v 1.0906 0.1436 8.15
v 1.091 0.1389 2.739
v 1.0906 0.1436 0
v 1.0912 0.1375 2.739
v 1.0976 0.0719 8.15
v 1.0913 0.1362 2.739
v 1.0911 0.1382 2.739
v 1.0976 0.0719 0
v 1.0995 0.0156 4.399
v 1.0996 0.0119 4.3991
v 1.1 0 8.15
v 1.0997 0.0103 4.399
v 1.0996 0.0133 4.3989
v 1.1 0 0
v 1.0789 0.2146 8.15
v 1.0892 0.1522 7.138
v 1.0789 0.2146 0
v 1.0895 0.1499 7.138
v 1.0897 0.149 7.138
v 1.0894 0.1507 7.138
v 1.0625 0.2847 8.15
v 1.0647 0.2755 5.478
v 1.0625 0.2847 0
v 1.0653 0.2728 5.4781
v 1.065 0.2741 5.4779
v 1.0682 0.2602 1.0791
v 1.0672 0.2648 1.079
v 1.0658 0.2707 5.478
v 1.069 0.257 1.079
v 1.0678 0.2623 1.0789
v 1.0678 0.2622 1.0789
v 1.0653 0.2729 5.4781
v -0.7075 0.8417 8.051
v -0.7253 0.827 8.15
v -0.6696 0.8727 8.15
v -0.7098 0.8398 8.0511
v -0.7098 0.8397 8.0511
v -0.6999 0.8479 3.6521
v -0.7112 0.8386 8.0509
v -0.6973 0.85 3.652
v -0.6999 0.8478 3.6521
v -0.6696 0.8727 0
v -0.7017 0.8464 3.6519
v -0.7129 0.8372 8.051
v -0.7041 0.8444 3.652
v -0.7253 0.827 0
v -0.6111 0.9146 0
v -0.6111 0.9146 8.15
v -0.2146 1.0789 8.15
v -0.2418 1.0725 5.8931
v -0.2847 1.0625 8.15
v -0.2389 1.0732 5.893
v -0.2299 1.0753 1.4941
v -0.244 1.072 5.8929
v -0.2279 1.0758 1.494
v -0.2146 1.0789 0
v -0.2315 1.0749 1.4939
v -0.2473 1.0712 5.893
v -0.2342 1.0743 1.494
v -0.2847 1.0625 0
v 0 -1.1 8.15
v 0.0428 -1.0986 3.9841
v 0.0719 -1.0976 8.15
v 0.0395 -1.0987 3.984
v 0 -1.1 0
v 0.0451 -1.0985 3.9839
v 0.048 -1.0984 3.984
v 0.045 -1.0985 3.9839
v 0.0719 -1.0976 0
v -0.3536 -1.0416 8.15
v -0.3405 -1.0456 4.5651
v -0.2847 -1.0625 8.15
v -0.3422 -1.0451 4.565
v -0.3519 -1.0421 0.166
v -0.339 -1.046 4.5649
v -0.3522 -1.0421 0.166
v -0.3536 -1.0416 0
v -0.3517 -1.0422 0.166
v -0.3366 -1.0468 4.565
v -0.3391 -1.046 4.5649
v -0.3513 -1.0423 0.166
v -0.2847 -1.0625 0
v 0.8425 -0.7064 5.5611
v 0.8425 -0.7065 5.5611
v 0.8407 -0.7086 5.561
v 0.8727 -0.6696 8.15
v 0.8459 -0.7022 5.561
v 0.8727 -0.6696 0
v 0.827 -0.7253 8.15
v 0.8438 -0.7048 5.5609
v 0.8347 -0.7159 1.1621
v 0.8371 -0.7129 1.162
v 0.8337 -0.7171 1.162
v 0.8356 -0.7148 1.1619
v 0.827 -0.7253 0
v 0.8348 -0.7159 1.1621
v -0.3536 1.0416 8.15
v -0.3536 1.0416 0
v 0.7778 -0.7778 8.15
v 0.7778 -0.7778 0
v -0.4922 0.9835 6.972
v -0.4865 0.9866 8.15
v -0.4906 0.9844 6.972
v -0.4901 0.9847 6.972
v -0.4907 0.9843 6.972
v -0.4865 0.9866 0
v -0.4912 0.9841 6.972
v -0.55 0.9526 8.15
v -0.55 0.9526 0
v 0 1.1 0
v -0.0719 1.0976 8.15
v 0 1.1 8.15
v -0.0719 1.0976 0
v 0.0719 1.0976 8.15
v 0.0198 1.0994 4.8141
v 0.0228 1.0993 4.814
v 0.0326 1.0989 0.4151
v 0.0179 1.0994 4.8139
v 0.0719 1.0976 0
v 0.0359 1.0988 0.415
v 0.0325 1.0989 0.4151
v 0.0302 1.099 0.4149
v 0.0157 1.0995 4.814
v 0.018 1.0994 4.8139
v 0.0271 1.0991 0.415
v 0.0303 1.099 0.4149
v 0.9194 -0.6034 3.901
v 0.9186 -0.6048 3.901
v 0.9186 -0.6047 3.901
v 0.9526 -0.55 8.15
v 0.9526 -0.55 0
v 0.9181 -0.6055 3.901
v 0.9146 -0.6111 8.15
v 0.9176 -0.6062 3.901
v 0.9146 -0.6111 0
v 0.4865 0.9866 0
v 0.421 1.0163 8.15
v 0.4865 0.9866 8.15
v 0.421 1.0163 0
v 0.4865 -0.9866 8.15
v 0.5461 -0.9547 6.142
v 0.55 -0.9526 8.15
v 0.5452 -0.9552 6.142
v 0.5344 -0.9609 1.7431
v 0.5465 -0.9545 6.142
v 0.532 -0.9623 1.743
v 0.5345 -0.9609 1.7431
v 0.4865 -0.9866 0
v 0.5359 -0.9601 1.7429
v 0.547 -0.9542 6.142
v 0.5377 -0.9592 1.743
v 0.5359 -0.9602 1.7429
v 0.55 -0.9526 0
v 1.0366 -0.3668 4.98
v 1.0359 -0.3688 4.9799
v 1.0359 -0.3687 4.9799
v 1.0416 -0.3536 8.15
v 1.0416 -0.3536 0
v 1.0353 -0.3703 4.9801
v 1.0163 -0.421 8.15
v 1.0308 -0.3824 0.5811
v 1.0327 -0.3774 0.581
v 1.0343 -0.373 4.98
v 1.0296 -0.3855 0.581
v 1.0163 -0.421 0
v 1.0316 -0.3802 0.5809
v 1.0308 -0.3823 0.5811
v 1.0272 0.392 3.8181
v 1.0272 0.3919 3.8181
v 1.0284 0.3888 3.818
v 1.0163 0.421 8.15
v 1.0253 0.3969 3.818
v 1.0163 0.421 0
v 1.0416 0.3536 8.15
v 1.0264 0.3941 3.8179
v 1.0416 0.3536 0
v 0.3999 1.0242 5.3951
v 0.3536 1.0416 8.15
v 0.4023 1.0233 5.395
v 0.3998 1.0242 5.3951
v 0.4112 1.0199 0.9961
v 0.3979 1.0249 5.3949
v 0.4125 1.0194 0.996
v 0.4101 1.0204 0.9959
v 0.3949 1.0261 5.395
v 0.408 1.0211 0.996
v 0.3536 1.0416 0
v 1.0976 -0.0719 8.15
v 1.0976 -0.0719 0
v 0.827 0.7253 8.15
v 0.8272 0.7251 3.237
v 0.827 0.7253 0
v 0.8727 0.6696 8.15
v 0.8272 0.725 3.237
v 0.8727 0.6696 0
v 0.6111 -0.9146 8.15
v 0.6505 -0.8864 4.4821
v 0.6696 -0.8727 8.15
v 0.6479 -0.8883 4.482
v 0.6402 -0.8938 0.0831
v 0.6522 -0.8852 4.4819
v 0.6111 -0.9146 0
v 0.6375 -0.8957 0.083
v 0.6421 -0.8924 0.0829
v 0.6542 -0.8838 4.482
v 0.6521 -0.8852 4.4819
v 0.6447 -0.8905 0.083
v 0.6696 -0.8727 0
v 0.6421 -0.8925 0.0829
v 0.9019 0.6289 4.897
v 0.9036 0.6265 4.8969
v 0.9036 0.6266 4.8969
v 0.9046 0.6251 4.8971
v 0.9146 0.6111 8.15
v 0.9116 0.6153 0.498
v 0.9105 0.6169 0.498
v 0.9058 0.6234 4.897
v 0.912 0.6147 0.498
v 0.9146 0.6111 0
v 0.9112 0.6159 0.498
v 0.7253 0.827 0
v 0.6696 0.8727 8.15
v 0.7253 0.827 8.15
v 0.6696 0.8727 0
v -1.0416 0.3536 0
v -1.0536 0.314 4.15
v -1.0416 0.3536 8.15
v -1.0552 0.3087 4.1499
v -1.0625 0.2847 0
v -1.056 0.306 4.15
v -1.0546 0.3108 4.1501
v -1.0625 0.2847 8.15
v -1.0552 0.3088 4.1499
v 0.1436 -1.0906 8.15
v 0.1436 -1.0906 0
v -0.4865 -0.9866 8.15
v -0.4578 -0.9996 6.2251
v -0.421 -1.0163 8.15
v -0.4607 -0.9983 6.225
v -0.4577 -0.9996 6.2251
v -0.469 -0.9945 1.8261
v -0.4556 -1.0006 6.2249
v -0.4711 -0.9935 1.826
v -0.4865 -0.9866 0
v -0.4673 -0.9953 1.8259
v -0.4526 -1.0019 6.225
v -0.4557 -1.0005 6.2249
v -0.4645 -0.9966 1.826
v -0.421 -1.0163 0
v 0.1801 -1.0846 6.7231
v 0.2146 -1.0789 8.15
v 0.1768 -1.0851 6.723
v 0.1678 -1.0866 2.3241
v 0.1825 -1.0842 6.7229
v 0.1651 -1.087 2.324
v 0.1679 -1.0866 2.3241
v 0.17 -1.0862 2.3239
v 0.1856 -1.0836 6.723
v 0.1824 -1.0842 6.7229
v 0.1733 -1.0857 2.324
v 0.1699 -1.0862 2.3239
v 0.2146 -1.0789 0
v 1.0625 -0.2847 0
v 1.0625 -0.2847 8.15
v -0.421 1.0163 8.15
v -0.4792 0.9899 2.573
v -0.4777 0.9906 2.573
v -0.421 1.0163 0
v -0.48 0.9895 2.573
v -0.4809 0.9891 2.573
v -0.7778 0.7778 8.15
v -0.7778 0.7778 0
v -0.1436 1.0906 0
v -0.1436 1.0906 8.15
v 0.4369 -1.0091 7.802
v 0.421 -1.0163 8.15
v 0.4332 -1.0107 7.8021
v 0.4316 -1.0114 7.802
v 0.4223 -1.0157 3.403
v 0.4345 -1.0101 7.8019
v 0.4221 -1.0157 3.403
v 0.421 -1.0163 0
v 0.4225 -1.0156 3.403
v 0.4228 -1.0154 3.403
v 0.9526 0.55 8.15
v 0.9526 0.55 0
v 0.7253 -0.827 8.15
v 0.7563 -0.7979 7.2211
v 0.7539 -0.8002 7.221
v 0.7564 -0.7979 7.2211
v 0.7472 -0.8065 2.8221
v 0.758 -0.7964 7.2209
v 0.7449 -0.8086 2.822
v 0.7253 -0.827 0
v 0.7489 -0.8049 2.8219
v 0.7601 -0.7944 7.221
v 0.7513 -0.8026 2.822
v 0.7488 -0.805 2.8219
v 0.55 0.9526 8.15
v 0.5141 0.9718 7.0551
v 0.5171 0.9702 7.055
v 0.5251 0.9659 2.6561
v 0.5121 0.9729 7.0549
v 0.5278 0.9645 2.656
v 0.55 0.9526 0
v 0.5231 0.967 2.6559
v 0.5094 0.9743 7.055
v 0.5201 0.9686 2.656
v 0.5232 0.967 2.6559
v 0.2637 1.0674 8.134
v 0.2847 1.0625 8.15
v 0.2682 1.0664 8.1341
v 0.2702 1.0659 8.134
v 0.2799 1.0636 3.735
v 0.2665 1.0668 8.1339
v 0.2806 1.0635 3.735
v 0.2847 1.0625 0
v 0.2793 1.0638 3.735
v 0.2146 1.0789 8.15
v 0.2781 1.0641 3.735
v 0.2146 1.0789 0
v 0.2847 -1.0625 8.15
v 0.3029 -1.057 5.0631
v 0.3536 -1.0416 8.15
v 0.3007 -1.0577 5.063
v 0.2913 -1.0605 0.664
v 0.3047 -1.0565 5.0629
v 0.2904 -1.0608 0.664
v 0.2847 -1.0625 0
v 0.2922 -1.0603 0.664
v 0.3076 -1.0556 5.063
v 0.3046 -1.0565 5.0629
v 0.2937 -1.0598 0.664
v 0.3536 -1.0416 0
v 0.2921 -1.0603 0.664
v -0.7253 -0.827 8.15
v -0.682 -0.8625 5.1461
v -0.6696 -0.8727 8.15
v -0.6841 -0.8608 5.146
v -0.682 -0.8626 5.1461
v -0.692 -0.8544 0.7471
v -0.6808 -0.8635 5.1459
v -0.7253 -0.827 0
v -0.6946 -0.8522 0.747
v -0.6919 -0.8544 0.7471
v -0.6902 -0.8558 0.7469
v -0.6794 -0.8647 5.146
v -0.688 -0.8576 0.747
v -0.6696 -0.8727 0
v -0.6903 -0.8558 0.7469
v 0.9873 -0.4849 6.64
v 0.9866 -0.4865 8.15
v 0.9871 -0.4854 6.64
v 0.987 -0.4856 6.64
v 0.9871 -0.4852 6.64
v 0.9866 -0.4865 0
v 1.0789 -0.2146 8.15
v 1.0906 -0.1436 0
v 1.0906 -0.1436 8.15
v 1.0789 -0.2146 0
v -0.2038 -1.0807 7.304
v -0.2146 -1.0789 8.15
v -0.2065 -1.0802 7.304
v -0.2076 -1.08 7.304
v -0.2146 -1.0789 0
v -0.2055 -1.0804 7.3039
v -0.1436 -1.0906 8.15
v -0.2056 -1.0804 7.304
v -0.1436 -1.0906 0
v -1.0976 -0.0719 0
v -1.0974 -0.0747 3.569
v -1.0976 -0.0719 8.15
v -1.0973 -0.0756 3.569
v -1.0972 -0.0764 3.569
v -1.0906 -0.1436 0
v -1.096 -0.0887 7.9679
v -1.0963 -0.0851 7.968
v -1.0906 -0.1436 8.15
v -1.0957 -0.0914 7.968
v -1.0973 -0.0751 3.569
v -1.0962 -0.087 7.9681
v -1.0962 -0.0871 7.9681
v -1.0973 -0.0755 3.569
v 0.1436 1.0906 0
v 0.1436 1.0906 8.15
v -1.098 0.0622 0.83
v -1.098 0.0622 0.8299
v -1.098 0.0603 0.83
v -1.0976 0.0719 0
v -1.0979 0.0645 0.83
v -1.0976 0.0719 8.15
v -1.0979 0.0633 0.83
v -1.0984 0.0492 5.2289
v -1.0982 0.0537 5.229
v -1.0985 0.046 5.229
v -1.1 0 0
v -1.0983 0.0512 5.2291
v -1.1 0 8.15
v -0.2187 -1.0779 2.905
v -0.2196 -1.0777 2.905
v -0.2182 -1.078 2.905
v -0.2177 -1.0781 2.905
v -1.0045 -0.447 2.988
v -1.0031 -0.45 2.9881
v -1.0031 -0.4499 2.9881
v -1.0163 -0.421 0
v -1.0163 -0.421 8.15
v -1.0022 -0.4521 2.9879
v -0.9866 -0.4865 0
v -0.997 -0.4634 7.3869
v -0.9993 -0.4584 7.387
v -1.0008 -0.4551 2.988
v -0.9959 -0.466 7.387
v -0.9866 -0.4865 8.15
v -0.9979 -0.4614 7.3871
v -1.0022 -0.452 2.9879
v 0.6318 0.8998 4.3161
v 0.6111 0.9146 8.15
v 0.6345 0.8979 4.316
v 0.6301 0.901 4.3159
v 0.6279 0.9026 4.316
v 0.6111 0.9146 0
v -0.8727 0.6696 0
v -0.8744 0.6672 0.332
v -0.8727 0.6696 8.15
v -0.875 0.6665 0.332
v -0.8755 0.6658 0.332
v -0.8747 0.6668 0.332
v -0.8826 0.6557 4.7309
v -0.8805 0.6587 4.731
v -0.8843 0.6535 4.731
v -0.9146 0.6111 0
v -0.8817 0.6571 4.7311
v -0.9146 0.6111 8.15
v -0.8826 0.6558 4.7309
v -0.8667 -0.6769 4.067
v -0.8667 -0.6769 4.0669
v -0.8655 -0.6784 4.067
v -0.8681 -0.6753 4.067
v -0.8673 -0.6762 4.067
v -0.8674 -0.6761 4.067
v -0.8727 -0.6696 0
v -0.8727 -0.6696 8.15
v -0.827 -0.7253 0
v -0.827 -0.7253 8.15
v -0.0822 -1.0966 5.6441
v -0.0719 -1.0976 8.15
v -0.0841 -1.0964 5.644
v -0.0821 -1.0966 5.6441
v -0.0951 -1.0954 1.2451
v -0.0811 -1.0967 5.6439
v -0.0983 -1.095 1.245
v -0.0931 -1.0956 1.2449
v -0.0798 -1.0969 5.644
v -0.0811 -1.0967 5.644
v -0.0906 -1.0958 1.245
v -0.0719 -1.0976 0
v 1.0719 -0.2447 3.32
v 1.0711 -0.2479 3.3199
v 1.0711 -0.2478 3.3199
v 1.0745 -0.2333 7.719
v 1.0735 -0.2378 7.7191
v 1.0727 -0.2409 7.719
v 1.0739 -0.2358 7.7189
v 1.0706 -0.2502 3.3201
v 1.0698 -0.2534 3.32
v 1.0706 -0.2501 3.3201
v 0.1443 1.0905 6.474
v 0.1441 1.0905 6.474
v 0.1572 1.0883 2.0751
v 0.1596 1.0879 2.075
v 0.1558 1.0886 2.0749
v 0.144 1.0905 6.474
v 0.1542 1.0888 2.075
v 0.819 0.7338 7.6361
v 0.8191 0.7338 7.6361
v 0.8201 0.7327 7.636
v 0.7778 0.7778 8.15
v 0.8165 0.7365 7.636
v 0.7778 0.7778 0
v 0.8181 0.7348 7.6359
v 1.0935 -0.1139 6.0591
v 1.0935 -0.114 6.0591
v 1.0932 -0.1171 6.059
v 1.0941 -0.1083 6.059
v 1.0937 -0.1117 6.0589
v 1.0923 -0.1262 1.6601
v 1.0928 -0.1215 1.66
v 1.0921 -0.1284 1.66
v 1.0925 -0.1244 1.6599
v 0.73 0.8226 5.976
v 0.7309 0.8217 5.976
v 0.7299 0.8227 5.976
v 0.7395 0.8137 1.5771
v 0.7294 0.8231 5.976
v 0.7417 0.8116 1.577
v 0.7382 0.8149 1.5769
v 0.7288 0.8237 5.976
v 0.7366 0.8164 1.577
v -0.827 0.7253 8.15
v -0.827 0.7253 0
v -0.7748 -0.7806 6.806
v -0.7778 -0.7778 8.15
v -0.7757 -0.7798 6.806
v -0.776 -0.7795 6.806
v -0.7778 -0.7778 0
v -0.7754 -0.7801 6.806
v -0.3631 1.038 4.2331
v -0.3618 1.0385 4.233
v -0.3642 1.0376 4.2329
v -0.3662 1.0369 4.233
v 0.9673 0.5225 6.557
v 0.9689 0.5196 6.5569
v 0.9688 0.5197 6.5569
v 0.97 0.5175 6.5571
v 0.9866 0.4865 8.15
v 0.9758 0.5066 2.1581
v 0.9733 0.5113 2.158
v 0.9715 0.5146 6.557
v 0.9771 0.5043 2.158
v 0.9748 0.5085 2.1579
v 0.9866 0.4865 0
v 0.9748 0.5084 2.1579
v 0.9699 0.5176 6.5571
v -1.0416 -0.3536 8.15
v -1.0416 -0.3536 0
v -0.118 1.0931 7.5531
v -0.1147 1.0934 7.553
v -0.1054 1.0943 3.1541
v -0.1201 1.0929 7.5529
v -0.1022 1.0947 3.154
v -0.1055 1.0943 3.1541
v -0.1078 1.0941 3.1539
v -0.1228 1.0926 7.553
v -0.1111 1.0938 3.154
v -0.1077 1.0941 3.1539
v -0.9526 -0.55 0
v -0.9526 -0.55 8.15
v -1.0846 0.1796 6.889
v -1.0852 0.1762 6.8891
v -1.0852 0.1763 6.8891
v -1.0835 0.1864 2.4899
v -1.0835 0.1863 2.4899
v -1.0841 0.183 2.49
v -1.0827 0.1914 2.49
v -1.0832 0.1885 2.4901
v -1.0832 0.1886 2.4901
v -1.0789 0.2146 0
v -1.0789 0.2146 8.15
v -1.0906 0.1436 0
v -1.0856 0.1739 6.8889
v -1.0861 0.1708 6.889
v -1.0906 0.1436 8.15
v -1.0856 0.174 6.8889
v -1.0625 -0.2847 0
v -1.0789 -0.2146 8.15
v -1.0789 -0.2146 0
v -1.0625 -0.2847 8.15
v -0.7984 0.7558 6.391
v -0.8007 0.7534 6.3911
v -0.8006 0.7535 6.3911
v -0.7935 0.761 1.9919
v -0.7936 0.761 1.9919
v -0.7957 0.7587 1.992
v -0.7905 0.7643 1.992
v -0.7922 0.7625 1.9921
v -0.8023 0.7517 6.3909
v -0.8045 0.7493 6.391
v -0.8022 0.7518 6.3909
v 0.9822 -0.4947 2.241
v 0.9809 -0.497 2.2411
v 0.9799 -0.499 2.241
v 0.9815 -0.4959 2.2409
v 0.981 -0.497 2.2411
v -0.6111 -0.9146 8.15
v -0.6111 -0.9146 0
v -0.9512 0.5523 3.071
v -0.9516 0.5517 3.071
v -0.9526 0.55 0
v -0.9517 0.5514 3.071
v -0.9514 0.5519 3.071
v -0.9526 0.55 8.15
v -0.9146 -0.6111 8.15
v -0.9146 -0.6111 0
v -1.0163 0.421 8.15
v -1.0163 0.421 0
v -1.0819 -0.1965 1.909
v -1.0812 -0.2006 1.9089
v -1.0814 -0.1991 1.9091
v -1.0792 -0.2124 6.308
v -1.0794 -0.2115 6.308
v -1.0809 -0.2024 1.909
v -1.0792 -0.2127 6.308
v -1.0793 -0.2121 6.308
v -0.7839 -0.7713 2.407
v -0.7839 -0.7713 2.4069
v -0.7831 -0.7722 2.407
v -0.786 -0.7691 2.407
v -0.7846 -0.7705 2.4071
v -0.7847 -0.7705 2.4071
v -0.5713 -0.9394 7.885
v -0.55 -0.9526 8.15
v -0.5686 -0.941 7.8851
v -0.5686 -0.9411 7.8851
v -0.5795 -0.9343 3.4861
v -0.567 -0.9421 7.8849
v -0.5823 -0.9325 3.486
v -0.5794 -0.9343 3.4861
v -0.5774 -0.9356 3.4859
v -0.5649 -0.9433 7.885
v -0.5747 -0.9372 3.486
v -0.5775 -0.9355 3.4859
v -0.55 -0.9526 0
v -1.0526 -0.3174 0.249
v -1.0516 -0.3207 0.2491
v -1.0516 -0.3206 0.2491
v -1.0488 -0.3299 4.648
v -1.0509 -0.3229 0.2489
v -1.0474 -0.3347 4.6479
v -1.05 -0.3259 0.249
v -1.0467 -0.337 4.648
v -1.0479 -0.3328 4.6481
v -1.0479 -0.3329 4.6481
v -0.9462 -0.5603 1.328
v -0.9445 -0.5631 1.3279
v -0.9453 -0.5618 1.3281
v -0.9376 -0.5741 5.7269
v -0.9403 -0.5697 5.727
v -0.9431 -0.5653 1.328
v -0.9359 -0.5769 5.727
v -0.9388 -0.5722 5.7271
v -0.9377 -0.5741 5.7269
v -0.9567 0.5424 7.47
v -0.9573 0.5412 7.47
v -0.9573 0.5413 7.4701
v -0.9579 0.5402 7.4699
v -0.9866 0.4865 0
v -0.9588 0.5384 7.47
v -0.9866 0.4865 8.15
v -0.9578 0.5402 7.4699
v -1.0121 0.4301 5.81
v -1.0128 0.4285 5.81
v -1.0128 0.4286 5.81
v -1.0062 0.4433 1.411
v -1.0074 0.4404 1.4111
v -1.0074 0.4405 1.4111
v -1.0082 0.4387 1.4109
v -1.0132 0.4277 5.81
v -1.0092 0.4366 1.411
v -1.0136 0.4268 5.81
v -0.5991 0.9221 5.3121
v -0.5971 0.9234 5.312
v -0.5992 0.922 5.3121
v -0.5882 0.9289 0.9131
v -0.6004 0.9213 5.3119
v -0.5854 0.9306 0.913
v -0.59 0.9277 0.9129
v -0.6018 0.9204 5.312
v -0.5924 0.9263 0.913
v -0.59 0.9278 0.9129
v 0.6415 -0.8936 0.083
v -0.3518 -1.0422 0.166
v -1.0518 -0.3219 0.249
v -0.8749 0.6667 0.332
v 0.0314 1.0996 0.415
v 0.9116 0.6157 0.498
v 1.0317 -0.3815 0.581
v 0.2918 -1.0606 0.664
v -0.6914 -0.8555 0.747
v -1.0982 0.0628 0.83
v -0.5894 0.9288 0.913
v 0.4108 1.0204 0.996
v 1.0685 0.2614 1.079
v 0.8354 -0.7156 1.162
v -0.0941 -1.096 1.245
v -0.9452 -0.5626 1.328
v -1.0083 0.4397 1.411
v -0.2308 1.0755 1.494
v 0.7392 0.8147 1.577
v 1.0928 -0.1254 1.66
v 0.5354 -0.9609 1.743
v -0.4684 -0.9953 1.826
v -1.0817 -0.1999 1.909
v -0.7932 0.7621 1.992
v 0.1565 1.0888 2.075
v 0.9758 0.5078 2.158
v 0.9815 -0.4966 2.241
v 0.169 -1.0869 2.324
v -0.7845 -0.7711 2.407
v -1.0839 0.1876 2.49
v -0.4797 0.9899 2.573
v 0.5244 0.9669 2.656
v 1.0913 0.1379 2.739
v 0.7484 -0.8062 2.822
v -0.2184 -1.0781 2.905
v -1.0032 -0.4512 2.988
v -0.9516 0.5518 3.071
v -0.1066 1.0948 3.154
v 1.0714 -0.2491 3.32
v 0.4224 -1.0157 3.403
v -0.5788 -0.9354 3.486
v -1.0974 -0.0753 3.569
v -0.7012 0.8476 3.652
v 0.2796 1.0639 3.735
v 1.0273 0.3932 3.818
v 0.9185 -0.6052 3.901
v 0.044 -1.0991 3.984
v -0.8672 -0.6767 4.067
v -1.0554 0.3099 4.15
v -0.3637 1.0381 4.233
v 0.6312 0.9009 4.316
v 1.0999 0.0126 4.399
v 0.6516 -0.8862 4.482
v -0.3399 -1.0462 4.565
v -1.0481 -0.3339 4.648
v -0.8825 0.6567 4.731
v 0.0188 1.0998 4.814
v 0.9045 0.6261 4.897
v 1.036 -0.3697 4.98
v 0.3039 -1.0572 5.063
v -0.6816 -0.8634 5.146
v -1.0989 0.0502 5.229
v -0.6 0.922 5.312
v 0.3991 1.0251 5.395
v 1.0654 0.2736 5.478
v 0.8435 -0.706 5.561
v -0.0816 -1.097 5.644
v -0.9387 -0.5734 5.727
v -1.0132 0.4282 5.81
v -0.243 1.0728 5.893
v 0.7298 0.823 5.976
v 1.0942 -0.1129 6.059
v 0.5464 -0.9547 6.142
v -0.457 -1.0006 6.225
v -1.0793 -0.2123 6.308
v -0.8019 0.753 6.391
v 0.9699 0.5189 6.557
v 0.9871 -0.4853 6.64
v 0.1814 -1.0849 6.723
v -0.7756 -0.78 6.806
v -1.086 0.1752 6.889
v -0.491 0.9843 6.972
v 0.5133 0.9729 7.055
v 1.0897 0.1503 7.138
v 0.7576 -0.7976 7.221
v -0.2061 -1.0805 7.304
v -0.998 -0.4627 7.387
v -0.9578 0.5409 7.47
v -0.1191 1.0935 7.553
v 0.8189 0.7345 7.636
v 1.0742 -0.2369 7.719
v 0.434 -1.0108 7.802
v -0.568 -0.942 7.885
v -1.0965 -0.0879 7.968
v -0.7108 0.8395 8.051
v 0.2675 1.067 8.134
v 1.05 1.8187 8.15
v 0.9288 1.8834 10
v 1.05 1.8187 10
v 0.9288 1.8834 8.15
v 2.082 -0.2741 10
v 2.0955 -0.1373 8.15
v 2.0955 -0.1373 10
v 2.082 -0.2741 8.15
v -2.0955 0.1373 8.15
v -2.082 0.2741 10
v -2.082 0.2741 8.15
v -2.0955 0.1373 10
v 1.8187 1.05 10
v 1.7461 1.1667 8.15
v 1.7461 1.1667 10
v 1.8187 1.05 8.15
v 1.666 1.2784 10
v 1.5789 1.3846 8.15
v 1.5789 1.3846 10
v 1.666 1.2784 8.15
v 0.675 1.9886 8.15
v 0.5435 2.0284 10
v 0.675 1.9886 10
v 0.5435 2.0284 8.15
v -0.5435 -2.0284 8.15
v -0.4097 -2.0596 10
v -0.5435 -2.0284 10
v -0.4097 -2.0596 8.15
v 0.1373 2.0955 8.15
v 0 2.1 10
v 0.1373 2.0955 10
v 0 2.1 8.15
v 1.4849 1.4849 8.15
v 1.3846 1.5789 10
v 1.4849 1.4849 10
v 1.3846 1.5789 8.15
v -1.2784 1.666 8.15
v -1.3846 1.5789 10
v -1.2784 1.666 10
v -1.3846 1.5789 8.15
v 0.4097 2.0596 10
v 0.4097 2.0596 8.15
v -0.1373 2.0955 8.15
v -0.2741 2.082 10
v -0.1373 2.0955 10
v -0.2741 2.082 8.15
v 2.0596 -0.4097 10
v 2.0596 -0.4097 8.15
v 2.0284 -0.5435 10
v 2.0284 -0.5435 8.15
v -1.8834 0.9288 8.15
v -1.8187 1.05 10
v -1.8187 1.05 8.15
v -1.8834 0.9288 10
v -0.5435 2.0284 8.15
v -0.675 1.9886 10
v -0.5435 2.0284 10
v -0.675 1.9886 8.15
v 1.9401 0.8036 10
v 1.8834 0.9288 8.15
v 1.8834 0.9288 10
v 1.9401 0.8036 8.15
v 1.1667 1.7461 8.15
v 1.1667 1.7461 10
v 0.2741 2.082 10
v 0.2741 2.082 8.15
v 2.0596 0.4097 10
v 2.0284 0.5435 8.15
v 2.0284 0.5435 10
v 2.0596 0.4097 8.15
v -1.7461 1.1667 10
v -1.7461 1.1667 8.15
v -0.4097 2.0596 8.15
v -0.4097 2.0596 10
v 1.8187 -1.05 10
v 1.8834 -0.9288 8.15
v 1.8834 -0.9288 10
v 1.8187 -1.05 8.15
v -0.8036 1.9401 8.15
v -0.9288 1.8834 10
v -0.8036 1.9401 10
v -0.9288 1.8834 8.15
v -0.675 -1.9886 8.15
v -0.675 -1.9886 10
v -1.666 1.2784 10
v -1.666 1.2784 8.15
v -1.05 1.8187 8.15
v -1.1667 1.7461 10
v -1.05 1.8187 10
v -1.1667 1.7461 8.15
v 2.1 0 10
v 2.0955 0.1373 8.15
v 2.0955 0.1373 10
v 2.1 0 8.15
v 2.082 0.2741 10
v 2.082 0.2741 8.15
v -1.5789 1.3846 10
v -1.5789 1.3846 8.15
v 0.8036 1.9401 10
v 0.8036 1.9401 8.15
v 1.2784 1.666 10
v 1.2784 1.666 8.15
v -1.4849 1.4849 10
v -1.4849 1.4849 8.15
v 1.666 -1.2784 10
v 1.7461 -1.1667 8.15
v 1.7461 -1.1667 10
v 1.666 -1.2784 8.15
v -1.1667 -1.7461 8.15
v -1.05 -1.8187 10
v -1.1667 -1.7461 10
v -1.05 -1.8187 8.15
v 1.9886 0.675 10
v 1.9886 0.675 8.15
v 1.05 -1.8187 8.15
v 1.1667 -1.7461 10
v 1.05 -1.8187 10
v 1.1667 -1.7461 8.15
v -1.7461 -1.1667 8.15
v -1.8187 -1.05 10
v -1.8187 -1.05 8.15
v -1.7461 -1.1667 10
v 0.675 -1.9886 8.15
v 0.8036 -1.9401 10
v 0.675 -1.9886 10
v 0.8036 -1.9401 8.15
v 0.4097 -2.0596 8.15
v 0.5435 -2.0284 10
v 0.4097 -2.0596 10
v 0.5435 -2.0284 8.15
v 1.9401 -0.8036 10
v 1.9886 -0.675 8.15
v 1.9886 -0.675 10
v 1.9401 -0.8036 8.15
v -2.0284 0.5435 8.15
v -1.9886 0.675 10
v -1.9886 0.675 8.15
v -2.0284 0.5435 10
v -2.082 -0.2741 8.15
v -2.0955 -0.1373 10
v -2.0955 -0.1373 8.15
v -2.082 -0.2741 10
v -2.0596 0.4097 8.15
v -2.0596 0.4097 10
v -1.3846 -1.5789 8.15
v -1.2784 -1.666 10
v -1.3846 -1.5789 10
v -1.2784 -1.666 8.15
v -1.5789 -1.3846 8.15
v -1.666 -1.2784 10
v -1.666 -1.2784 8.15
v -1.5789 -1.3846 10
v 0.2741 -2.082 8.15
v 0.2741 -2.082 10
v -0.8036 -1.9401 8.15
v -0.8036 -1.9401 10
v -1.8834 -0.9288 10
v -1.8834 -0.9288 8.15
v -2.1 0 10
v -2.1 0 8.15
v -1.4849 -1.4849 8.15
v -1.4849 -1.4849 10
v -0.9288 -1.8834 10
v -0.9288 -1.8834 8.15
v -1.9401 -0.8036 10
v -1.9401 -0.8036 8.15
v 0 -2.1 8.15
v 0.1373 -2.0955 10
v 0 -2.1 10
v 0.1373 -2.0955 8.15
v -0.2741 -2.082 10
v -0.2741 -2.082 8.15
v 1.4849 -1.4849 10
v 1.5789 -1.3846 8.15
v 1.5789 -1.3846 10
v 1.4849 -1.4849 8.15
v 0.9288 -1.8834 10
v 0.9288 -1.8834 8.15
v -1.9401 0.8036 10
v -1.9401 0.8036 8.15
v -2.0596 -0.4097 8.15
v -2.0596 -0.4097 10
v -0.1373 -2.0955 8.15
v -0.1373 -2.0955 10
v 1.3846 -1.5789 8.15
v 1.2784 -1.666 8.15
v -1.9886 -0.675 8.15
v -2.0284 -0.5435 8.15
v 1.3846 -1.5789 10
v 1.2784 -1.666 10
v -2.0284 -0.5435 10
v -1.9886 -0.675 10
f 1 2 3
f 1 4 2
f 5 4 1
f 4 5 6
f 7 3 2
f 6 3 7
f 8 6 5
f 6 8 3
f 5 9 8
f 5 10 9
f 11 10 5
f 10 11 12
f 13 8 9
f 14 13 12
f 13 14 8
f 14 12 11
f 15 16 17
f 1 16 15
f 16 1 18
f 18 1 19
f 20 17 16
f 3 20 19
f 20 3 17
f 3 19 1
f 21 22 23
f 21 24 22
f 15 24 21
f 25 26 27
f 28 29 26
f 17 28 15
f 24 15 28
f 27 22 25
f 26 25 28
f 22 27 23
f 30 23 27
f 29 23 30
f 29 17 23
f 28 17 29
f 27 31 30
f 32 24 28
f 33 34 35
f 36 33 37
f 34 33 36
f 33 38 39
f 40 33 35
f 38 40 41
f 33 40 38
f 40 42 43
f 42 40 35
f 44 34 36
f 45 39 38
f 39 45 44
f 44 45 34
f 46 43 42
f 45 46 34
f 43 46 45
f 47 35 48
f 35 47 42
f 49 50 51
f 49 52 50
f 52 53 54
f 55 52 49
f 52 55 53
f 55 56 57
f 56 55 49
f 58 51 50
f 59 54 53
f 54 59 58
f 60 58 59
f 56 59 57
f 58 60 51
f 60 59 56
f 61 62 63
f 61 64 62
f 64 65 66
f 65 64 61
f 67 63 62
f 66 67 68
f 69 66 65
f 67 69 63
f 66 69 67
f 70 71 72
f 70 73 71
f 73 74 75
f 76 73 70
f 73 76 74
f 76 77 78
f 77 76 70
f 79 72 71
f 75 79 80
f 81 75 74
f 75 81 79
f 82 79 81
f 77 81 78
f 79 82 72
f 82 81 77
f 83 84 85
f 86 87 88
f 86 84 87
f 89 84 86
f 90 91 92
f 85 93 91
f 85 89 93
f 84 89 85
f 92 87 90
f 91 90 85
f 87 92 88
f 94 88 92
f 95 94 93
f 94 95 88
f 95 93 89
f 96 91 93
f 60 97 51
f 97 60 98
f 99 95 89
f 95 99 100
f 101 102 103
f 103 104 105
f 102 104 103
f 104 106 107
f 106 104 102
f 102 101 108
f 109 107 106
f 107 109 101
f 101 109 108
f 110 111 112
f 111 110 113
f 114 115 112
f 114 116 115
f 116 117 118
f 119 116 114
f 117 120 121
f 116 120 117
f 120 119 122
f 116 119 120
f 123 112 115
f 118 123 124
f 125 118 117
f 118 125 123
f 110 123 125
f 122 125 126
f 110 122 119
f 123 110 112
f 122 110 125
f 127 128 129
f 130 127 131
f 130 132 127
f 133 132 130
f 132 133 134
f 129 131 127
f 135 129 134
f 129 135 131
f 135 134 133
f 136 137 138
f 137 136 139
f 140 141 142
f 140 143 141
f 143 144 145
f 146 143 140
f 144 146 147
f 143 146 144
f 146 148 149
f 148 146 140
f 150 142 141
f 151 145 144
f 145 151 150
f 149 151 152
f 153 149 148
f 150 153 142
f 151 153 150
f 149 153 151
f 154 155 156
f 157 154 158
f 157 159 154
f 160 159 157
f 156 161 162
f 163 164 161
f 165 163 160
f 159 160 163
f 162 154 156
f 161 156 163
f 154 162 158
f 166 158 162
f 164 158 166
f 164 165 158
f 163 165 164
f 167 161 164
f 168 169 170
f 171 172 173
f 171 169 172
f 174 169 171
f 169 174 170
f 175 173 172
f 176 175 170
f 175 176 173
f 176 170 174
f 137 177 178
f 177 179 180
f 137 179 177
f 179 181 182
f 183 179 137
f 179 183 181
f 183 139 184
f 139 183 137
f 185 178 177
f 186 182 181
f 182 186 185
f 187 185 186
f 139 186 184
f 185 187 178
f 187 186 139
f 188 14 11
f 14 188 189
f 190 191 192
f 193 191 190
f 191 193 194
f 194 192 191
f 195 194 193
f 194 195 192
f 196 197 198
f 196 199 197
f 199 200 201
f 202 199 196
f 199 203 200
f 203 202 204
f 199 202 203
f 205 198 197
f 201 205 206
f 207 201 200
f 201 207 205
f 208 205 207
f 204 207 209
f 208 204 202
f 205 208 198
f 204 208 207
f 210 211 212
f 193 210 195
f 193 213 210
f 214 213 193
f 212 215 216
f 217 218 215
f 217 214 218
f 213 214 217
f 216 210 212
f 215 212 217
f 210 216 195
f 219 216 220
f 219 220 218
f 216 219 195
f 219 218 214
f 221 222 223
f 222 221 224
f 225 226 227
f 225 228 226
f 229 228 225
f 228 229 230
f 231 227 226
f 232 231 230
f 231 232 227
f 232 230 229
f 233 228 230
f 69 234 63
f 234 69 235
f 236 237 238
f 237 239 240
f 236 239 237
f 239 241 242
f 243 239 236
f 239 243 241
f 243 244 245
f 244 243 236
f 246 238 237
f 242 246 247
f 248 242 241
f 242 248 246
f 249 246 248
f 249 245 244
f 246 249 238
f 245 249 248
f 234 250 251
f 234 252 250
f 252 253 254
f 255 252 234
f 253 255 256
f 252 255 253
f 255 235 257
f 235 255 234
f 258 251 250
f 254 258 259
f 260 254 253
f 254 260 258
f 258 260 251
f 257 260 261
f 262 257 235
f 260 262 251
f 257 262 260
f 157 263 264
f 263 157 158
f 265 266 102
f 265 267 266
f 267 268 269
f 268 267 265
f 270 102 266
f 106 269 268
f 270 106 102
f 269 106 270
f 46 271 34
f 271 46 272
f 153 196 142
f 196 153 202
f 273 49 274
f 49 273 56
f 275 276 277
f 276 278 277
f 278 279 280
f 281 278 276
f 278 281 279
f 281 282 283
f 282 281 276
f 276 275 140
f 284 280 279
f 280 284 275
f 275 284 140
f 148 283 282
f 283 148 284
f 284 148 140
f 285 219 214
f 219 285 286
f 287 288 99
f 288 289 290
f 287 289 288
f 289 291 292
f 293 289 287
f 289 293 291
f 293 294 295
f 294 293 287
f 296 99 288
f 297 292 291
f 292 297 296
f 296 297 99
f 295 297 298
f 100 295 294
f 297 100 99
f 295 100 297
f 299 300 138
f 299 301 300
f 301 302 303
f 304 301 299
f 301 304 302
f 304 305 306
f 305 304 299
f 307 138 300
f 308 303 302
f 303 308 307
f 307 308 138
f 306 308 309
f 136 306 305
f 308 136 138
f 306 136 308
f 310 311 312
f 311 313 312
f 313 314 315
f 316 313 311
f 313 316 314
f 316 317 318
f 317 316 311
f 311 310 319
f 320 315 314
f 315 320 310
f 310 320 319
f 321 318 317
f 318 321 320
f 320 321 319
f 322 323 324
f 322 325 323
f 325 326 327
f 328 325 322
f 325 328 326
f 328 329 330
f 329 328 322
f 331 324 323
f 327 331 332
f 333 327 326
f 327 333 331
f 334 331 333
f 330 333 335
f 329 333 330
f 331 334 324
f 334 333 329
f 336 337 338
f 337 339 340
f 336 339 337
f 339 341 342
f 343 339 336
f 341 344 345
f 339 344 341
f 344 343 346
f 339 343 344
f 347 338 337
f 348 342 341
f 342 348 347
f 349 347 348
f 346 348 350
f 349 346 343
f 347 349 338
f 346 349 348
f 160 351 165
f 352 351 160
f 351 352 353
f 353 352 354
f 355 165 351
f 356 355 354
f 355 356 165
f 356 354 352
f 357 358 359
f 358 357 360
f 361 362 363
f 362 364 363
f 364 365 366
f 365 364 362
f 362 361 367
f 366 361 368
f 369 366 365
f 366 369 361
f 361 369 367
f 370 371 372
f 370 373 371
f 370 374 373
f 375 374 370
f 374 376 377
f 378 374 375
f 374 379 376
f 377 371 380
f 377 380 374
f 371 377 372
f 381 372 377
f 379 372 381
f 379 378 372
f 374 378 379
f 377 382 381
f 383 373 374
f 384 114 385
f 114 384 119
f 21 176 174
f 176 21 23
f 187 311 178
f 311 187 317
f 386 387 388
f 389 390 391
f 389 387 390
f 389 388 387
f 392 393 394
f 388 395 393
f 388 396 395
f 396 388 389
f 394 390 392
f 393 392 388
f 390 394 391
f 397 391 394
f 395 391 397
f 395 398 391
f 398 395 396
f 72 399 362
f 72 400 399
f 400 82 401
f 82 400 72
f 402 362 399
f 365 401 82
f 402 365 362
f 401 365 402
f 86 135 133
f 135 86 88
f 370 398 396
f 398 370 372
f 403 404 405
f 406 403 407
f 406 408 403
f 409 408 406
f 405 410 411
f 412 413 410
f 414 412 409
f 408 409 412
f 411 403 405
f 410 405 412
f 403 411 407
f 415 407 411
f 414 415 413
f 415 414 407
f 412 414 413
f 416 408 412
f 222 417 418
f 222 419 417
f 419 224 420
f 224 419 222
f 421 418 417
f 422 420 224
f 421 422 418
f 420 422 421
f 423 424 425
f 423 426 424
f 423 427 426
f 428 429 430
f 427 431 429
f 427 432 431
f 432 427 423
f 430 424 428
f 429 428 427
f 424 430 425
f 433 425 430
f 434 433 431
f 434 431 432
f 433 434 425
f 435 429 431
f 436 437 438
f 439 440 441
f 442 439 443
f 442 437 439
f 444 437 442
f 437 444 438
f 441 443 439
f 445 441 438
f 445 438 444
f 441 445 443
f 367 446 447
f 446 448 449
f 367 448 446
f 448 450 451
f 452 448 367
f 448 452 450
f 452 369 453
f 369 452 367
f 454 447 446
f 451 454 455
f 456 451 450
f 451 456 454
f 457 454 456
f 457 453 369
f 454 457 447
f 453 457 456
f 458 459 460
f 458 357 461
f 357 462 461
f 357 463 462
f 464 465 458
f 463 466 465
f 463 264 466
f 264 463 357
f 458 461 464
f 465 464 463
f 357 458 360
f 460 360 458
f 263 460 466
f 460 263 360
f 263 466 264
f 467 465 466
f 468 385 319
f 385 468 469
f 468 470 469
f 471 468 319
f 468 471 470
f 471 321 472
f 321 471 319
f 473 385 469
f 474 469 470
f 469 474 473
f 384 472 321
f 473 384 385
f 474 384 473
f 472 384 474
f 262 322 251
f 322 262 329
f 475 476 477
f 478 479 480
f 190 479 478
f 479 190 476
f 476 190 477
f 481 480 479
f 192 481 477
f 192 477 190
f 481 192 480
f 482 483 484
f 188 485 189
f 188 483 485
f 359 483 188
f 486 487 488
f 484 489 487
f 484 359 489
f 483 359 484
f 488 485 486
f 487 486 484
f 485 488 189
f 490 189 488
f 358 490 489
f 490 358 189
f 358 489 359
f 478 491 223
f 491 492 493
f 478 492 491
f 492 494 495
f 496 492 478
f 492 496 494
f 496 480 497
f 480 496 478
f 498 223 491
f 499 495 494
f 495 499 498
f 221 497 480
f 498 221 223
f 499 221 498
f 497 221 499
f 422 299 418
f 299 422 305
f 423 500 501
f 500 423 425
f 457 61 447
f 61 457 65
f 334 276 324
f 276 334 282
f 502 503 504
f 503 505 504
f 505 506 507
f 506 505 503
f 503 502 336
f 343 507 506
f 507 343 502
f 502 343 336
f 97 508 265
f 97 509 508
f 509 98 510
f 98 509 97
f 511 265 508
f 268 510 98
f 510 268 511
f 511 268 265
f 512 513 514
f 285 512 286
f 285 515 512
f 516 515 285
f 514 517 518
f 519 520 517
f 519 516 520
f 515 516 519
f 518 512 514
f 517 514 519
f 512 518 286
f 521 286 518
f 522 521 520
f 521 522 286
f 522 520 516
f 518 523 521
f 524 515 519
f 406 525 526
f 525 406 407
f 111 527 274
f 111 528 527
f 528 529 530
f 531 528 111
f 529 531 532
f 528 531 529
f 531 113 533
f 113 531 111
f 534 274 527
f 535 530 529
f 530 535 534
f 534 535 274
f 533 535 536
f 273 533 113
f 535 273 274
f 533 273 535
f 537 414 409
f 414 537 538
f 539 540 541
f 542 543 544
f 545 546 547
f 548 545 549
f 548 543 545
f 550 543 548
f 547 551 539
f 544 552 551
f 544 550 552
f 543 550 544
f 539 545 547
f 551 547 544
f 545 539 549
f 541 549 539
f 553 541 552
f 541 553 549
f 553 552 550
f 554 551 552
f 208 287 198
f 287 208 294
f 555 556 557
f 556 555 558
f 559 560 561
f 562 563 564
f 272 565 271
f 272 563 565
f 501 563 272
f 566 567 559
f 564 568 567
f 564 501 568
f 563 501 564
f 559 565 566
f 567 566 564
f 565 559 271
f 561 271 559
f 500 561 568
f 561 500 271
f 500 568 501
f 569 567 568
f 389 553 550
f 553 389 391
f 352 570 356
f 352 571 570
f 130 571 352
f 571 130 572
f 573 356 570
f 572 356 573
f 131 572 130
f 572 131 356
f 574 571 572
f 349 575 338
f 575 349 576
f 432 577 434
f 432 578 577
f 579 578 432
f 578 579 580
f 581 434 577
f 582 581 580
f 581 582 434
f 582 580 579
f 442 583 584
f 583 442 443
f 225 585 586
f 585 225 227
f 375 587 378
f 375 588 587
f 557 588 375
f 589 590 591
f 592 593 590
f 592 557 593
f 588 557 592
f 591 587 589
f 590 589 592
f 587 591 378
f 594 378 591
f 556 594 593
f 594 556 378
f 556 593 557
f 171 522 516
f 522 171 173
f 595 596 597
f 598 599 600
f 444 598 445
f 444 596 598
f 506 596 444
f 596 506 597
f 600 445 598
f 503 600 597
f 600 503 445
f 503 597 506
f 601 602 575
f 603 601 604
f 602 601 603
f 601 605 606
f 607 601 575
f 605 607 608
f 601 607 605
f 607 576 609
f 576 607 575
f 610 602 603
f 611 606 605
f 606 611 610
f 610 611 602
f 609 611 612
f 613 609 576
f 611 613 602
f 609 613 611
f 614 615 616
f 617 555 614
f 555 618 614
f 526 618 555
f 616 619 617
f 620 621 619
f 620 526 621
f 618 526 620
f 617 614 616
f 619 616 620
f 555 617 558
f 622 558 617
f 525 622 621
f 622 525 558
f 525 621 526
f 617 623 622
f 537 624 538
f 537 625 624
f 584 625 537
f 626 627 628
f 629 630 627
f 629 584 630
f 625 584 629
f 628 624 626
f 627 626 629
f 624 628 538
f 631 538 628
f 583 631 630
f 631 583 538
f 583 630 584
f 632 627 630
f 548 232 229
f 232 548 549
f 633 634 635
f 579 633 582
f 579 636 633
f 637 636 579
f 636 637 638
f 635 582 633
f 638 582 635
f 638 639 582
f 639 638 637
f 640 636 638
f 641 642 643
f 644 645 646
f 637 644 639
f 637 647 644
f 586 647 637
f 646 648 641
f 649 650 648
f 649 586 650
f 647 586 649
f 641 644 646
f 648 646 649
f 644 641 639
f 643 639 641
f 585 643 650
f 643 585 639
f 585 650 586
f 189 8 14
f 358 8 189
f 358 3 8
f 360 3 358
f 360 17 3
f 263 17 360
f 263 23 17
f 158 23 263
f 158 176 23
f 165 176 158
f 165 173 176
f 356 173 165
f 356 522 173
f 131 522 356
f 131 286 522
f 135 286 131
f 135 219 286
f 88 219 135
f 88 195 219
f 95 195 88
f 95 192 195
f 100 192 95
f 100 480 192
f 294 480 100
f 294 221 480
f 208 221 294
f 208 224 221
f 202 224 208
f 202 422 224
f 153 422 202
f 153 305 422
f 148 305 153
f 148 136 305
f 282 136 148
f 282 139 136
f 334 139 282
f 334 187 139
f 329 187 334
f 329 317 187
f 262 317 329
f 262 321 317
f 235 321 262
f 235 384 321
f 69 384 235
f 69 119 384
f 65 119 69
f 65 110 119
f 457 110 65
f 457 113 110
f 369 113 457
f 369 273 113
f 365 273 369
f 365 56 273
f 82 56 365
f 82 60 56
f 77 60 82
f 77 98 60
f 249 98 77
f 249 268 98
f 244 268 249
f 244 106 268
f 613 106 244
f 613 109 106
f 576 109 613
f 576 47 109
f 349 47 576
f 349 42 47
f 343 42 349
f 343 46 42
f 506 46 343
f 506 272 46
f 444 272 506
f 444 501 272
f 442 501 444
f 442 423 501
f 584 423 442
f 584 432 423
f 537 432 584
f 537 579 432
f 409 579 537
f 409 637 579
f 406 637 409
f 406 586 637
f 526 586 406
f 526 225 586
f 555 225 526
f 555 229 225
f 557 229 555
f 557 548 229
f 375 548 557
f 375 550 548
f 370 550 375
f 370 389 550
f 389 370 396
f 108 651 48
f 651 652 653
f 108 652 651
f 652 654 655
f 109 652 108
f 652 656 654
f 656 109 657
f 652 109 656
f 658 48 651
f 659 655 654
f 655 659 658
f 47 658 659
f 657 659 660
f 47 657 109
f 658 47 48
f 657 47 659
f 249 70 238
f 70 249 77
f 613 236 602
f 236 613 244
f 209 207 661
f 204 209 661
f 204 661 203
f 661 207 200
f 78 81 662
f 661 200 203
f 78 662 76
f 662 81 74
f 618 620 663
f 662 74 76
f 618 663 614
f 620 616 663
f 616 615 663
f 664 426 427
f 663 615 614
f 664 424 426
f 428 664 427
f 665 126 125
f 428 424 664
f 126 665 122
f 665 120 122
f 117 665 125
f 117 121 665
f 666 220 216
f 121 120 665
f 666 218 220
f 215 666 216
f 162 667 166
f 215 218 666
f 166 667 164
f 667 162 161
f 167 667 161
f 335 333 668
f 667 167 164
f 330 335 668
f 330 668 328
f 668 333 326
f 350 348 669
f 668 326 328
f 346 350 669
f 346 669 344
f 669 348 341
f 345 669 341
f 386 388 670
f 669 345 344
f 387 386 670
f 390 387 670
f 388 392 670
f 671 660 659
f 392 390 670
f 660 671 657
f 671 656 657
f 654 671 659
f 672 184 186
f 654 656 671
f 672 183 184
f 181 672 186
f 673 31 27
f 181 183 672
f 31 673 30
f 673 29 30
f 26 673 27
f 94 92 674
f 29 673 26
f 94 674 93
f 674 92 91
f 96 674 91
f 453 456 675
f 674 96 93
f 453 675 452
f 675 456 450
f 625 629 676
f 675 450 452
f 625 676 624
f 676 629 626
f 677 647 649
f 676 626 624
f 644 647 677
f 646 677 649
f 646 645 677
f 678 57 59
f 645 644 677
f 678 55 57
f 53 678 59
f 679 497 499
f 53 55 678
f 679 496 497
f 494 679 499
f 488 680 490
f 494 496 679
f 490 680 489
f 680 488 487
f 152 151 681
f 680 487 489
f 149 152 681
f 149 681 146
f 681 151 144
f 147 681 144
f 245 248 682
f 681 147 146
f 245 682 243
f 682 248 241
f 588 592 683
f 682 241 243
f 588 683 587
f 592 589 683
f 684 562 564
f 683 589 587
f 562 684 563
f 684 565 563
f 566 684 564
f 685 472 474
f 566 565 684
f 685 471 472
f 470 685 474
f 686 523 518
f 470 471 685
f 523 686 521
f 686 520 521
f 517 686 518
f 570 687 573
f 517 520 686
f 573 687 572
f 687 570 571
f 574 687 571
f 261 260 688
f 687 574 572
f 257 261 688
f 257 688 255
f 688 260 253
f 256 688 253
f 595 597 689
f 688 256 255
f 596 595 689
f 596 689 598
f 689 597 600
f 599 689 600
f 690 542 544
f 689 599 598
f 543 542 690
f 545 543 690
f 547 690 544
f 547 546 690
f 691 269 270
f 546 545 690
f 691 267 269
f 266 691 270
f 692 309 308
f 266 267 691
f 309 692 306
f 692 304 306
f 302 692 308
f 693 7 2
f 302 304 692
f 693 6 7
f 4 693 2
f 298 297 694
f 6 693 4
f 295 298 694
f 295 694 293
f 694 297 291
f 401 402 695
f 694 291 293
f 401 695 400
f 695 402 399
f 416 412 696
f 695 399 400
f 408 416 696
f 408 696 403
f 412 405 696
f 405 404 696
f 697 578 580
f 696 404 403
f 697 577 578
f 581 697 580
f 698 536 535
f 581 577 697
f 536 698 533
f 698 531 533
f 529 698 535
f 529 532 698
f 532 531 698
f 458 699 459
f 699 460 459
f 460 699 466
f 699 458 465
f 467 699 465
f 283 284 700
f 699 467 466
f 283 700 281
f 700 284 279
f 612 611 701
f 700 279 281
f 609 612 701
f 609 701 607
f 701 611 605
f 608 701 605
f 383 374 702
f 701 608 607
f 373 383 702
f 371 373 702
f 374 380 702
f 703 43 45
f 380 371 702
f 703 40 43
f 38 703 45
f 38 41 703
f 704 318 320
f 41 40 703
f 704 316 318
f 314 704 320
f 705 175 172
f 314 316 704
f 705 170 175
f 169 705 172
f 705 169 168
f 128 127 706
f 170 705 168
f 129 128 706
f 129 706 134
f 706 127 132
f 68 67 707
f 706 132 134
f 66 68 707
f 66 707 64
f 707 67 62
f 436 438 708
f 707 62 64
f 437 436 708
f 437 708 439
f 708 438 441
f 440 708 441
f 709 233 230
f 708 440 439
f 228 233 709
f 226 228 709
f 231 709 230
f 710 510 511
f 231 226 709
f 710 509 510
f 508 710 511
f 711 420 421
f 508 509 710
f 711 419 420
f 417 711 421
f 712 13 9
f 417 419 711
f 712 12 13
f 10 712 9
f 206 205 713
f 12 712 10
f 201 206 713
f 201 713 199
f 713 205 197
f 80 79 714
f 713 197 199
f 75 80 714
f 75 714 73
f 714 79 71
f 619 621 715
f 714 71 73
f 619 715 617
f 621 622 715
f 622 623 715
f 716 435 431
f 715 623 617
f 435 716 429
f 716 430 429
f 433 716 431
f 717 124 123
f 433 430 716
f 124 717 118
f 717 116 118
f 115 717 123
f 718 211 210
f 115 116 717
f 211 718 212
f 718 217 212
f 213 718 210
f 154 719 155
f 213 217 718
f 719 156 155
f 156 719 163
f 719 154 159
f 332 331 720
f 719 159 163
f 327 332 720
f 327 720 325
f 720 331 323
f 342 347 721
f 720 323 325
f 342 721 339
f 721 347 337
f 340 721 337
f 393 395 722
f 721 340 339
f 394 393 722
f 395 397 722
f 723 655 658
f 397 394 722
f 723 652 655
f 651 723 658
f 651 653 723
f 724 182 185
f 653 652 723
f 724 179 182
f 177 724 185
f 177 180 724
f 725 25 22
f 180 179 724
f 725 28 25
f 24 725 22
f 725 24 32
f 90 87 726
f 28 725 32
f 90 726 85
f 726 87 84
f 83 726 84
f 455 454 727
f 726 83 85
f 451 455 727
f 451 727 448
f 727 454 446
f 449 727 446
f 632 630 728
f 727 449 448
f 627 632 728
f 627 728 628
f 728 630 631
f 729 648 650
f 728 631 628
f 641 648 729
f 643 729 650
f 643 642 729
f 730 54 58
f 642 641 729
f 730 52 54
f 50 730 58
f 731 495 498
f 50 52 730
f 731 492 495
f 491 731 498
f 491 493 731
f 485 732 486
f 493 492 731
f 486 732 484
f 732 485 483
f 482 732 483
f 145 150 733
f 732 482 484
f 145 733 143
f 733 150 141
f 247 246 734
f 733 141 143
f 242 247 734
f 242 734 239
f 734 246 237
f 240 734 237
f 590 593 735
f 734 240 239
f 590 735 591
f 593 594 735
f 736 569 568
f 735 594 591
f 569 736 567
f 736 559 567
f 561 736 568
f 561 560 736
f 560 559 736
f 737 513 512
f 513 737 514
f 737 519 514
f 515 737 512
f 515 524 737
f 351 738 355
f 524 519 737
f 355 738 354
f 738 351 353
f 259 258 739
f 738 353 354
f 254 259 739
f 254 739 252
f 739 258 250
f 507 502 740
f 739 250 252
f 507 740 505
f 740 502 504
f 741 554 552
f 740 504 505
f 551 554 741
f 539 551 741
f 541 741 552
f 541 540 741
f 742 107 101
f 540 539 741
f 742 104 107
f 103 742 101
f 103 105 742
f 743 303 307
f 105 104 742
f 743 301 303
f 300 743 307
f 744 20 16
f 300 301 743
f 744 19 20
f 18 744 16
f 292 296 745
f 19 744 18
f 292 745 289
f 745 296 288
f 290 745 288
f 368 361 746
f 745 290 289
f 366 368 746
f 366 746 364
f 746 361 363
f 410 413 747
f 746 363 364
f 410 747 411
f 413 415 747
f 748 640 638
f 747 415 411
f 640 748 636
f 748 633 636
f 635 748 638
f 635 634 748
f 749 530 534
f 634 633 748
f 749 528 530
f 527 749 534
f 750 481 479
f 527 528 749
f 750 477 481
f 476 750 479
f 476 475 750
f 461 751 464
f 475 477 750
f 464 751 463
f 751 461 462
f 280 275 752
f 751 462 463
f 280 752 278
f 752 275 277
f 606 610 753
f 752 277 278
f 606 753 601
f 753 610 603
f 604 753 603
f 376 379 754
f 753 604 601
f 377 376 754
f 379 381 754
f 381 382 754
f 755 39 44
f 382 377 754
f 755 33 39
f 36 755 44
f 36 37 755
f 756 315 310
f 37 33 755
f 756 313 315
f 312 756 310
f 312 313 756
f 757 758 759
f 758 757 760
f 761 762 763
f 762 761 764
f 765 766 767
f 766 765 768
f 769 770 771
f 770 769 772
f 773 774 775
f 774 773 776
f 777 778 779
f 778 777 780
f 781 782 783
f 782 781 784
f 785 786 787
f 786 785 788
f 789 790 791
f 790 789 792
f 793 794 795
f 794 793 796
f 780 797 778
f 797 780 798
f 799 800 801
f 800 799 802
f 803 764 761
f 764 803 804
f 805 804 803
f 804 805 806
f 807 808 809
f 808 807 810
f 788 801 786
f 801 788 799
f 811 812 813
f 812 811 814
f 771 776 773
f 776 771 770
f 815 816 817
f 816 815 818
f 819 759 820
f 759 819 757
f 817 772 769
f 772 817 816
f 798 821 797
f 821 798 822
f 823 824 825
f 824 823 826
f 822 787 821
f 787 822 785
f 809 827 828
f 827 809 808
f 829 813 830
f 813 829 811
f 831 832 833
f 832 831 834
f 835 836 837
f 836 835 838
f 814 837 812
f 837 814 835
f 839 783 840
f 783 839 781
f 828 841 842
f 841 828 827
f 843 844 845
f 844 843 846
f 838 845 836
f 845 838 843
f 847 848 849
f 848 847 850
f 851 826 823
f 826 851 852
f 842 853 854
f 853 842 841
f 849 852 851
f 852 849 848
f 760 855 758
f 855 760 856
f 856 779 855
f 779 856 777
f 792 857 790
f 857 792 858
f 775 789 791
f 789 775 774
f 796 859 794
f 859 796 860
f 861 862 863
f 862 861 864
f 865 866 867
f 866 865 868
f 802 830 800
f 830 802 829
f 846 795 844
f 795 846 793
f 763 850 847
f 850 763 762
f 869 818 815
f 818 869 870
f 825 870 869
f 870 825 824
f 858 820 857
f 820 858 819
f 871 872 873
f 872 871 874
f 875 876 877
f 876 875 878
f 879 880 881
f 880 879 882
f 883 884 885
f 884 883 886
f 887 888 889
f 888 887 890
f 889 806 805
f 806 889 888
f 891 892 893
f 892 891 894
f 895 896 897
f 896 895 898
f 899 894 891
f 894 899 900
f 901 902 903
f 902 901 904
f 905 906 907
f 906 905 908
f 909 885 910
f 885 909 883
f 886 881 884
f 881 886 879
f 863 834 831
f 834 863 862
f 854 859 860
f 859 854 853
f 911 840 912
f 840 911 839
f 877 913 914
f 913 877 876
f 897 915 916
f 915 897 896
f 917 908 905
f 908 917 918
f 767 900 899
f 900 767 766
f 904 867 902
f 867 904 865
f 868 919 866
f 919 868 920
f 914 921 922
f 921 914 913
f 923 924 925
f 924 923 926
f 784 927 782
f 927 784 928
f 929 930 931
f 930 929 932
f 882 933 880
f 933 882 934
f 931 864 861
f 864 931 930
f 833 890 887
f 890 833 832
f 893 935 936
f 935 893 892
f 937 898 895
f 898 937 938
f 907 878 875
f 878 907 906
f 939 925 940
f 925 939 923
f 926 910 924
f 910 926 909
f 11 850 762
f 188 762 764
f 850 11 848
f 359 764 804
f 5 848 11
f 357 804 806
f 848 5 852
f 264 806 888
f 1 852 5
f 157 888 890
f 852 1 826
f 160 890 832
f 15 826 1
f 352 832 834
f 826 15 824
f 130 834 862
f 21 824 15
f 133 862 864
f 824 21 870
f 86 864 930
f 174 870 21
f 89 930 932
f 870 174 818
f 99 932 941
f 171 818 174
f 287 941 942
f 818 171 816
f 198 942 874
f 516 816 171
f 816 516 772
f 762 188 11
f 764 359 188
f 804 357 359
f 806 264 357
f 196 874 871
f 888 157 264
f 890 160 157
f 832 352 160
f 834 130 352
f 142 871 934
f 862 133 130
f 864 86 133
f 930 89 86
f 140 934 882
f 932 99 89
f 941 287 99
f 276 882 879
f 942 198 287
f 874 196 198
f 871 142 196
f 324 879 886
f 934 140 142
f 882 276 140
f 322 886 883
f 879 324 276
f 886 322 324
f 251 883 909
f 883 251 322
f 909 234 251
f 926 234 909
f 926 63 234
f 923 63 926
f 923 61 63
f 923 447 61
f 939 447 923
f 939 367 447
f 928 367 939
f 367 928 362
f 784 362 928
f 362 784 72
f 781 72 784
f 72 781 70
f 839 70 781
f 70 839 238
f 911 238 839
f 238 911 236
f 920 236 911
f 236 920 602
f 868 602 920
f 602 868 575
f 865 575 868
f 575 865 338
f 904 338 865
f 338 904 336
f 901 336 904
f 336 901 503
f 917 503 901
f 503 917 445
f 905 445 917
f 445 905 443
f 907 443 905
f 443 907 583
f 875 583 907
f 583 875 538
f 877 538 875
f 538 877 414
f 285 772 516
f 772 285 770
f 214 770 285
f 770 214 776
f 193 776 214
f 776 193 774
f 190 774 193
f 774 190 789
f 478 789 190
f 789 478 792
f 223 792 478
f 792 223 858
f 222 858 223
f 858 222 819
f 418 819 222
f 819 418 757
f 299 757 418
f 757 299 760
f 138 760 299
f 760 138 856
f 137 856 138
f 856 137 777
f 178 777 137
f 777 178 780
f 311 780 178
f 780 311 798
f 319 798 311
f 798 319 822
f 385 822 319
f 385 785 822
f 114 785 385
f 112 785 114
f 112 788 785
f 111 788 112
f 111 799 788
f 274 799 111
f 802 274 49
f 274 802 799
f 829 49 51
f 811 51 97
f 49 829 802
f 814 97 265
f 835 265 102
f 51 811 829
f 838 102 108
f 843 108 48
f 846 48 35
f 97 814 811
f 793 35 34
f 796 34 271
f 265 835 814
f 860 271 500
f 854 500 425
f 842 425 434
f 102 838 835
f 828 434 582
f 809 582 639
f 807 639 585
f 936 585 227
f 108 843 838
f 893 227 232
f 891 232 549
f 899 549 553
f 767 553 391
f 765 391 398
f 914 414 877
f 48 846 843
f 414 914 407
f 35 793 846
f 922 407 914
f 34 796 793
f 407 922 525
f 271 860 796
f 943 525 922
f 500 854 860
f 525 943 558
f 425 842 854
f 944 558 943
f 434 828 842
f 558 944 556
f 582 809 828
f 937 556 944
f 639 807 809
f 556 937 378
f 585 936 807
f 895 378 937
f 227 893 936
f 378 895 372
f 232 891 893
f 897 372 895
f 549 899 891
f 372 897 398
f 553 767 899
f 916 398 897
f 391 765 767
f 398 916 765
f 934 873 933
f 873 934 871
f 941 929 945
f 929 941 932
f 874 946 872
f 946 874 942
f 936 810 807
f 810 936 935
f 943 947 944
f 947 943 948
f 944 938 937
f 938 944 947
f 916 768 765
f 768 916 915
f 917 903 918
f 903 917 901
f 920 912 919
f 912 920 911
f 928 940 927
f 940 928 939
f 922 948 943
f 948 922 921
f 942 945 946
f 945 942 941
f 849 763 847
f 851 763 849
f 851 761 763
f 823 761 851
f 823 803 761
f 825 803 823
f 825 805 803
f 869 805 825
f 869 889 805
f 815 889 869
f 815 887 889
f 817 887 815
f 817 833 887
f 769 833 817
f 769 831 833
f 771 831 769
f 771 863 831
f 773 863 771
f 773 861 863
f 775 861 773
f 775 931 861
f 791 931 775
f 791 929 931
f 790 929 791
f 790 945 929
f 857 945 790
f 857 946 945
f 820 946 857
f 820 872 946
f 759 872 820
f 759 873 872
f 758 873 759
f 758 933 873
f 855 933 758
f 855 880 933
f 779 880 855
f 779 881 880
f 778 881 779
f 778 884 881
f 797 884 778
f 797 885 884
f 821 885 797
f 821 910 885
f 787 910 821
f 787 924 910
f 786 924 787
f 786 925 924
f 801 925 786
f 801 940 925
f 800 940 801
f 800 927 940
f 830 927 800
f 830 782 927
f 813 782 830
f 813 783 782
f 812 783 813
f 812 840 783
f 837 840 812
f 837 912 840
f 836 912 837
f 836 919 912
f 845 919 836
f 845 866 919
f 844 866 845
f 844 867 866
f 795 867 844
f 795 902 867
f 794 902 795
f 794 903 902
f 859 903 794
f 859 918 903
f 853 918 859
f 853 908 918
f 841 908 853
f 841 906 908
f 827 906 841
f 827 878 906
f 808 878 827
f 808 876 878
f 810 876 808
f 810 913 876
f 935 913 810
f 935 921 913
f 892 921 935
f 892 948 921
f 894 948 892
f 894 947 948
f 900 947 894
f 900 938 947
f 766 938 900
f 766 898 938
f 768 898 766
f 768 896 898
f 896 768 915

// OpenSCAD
// Pan head screw (single connected solid)
// Target: shaft Ø2.2mm, head Ø4.2mm, head height 1.7mm, total length 10mm

$fn = 96;

// Parameters
shaft_diameter = 2.2;
shaft_radius   = shaft_diameter/2;

length         = 10;

head_diameter  = 4.2;
head_radius    = head_diameter/2;
head_height    = 1.7;

// Thread approximation (visual)
thread_pitch   = 0.55;   // mm
thread_depth   = 0.18;   // mm (radial)
thread_len     = length - head_height; // threaded shank length

// Small overlap to guarantee manifold union
overlap = 0.15;

// Pan head profile controls
head_top_flat_r = head_radius * 0.55;  // small flat on top
head_fillet_r   = 0.35;               // rounding at head/shank junction

module pan_head_screw() {
    union() {
        // Shank core (cylindrical)
        translate([0,0,0])
            cylinder(h=thread_len + overlap, r=shaft_radius, center=false);

        // Approximate external thread as a helical ridge (unioned, not subtracted)
        // Keeps model one connected solid and visually threaded.
        translate([0,0,0])
            linear_extrude(height=thread_len, twist=360*(thread_len/thread_pitch), slices=max(40, ceil(thread_len*12)))
                translate([shaft_radius - thread_depth, 0, 0])
                    circle(r=thread_depth, $fn=24);

        // Pan head (rounded dome-ish) built from hull of two cylinders
        // Bottom of head starts at z=thread_len and overlaps into shank.
        translate([0,0,thread_len - overlap])
            hull() {
                // Base ring (slightly larger than shank, helps fillet)
                cylinder(h=overlap + 0.01, r=max(shaft_radius + head_fillet_r, head_radius*0.75), center=false);

                // Main head body
                translate([0,0,head_height])
                    cylinder(h=0.01, r=head_top_flat_r, center=false);

                // Outer diameter control at head base
                translate([0,0,0.25*head_height])
                    cylinder(h=0.01, r=head_radius, center=false);
            }

        // Ensure exact head height and diameter with a gentle cap (adds material only)
        translate([0,0,thread_len - overlap])
            cylinder(h=head_height + overlap, r=head_radius, center=false);
    }
}

pan_head_screw();
